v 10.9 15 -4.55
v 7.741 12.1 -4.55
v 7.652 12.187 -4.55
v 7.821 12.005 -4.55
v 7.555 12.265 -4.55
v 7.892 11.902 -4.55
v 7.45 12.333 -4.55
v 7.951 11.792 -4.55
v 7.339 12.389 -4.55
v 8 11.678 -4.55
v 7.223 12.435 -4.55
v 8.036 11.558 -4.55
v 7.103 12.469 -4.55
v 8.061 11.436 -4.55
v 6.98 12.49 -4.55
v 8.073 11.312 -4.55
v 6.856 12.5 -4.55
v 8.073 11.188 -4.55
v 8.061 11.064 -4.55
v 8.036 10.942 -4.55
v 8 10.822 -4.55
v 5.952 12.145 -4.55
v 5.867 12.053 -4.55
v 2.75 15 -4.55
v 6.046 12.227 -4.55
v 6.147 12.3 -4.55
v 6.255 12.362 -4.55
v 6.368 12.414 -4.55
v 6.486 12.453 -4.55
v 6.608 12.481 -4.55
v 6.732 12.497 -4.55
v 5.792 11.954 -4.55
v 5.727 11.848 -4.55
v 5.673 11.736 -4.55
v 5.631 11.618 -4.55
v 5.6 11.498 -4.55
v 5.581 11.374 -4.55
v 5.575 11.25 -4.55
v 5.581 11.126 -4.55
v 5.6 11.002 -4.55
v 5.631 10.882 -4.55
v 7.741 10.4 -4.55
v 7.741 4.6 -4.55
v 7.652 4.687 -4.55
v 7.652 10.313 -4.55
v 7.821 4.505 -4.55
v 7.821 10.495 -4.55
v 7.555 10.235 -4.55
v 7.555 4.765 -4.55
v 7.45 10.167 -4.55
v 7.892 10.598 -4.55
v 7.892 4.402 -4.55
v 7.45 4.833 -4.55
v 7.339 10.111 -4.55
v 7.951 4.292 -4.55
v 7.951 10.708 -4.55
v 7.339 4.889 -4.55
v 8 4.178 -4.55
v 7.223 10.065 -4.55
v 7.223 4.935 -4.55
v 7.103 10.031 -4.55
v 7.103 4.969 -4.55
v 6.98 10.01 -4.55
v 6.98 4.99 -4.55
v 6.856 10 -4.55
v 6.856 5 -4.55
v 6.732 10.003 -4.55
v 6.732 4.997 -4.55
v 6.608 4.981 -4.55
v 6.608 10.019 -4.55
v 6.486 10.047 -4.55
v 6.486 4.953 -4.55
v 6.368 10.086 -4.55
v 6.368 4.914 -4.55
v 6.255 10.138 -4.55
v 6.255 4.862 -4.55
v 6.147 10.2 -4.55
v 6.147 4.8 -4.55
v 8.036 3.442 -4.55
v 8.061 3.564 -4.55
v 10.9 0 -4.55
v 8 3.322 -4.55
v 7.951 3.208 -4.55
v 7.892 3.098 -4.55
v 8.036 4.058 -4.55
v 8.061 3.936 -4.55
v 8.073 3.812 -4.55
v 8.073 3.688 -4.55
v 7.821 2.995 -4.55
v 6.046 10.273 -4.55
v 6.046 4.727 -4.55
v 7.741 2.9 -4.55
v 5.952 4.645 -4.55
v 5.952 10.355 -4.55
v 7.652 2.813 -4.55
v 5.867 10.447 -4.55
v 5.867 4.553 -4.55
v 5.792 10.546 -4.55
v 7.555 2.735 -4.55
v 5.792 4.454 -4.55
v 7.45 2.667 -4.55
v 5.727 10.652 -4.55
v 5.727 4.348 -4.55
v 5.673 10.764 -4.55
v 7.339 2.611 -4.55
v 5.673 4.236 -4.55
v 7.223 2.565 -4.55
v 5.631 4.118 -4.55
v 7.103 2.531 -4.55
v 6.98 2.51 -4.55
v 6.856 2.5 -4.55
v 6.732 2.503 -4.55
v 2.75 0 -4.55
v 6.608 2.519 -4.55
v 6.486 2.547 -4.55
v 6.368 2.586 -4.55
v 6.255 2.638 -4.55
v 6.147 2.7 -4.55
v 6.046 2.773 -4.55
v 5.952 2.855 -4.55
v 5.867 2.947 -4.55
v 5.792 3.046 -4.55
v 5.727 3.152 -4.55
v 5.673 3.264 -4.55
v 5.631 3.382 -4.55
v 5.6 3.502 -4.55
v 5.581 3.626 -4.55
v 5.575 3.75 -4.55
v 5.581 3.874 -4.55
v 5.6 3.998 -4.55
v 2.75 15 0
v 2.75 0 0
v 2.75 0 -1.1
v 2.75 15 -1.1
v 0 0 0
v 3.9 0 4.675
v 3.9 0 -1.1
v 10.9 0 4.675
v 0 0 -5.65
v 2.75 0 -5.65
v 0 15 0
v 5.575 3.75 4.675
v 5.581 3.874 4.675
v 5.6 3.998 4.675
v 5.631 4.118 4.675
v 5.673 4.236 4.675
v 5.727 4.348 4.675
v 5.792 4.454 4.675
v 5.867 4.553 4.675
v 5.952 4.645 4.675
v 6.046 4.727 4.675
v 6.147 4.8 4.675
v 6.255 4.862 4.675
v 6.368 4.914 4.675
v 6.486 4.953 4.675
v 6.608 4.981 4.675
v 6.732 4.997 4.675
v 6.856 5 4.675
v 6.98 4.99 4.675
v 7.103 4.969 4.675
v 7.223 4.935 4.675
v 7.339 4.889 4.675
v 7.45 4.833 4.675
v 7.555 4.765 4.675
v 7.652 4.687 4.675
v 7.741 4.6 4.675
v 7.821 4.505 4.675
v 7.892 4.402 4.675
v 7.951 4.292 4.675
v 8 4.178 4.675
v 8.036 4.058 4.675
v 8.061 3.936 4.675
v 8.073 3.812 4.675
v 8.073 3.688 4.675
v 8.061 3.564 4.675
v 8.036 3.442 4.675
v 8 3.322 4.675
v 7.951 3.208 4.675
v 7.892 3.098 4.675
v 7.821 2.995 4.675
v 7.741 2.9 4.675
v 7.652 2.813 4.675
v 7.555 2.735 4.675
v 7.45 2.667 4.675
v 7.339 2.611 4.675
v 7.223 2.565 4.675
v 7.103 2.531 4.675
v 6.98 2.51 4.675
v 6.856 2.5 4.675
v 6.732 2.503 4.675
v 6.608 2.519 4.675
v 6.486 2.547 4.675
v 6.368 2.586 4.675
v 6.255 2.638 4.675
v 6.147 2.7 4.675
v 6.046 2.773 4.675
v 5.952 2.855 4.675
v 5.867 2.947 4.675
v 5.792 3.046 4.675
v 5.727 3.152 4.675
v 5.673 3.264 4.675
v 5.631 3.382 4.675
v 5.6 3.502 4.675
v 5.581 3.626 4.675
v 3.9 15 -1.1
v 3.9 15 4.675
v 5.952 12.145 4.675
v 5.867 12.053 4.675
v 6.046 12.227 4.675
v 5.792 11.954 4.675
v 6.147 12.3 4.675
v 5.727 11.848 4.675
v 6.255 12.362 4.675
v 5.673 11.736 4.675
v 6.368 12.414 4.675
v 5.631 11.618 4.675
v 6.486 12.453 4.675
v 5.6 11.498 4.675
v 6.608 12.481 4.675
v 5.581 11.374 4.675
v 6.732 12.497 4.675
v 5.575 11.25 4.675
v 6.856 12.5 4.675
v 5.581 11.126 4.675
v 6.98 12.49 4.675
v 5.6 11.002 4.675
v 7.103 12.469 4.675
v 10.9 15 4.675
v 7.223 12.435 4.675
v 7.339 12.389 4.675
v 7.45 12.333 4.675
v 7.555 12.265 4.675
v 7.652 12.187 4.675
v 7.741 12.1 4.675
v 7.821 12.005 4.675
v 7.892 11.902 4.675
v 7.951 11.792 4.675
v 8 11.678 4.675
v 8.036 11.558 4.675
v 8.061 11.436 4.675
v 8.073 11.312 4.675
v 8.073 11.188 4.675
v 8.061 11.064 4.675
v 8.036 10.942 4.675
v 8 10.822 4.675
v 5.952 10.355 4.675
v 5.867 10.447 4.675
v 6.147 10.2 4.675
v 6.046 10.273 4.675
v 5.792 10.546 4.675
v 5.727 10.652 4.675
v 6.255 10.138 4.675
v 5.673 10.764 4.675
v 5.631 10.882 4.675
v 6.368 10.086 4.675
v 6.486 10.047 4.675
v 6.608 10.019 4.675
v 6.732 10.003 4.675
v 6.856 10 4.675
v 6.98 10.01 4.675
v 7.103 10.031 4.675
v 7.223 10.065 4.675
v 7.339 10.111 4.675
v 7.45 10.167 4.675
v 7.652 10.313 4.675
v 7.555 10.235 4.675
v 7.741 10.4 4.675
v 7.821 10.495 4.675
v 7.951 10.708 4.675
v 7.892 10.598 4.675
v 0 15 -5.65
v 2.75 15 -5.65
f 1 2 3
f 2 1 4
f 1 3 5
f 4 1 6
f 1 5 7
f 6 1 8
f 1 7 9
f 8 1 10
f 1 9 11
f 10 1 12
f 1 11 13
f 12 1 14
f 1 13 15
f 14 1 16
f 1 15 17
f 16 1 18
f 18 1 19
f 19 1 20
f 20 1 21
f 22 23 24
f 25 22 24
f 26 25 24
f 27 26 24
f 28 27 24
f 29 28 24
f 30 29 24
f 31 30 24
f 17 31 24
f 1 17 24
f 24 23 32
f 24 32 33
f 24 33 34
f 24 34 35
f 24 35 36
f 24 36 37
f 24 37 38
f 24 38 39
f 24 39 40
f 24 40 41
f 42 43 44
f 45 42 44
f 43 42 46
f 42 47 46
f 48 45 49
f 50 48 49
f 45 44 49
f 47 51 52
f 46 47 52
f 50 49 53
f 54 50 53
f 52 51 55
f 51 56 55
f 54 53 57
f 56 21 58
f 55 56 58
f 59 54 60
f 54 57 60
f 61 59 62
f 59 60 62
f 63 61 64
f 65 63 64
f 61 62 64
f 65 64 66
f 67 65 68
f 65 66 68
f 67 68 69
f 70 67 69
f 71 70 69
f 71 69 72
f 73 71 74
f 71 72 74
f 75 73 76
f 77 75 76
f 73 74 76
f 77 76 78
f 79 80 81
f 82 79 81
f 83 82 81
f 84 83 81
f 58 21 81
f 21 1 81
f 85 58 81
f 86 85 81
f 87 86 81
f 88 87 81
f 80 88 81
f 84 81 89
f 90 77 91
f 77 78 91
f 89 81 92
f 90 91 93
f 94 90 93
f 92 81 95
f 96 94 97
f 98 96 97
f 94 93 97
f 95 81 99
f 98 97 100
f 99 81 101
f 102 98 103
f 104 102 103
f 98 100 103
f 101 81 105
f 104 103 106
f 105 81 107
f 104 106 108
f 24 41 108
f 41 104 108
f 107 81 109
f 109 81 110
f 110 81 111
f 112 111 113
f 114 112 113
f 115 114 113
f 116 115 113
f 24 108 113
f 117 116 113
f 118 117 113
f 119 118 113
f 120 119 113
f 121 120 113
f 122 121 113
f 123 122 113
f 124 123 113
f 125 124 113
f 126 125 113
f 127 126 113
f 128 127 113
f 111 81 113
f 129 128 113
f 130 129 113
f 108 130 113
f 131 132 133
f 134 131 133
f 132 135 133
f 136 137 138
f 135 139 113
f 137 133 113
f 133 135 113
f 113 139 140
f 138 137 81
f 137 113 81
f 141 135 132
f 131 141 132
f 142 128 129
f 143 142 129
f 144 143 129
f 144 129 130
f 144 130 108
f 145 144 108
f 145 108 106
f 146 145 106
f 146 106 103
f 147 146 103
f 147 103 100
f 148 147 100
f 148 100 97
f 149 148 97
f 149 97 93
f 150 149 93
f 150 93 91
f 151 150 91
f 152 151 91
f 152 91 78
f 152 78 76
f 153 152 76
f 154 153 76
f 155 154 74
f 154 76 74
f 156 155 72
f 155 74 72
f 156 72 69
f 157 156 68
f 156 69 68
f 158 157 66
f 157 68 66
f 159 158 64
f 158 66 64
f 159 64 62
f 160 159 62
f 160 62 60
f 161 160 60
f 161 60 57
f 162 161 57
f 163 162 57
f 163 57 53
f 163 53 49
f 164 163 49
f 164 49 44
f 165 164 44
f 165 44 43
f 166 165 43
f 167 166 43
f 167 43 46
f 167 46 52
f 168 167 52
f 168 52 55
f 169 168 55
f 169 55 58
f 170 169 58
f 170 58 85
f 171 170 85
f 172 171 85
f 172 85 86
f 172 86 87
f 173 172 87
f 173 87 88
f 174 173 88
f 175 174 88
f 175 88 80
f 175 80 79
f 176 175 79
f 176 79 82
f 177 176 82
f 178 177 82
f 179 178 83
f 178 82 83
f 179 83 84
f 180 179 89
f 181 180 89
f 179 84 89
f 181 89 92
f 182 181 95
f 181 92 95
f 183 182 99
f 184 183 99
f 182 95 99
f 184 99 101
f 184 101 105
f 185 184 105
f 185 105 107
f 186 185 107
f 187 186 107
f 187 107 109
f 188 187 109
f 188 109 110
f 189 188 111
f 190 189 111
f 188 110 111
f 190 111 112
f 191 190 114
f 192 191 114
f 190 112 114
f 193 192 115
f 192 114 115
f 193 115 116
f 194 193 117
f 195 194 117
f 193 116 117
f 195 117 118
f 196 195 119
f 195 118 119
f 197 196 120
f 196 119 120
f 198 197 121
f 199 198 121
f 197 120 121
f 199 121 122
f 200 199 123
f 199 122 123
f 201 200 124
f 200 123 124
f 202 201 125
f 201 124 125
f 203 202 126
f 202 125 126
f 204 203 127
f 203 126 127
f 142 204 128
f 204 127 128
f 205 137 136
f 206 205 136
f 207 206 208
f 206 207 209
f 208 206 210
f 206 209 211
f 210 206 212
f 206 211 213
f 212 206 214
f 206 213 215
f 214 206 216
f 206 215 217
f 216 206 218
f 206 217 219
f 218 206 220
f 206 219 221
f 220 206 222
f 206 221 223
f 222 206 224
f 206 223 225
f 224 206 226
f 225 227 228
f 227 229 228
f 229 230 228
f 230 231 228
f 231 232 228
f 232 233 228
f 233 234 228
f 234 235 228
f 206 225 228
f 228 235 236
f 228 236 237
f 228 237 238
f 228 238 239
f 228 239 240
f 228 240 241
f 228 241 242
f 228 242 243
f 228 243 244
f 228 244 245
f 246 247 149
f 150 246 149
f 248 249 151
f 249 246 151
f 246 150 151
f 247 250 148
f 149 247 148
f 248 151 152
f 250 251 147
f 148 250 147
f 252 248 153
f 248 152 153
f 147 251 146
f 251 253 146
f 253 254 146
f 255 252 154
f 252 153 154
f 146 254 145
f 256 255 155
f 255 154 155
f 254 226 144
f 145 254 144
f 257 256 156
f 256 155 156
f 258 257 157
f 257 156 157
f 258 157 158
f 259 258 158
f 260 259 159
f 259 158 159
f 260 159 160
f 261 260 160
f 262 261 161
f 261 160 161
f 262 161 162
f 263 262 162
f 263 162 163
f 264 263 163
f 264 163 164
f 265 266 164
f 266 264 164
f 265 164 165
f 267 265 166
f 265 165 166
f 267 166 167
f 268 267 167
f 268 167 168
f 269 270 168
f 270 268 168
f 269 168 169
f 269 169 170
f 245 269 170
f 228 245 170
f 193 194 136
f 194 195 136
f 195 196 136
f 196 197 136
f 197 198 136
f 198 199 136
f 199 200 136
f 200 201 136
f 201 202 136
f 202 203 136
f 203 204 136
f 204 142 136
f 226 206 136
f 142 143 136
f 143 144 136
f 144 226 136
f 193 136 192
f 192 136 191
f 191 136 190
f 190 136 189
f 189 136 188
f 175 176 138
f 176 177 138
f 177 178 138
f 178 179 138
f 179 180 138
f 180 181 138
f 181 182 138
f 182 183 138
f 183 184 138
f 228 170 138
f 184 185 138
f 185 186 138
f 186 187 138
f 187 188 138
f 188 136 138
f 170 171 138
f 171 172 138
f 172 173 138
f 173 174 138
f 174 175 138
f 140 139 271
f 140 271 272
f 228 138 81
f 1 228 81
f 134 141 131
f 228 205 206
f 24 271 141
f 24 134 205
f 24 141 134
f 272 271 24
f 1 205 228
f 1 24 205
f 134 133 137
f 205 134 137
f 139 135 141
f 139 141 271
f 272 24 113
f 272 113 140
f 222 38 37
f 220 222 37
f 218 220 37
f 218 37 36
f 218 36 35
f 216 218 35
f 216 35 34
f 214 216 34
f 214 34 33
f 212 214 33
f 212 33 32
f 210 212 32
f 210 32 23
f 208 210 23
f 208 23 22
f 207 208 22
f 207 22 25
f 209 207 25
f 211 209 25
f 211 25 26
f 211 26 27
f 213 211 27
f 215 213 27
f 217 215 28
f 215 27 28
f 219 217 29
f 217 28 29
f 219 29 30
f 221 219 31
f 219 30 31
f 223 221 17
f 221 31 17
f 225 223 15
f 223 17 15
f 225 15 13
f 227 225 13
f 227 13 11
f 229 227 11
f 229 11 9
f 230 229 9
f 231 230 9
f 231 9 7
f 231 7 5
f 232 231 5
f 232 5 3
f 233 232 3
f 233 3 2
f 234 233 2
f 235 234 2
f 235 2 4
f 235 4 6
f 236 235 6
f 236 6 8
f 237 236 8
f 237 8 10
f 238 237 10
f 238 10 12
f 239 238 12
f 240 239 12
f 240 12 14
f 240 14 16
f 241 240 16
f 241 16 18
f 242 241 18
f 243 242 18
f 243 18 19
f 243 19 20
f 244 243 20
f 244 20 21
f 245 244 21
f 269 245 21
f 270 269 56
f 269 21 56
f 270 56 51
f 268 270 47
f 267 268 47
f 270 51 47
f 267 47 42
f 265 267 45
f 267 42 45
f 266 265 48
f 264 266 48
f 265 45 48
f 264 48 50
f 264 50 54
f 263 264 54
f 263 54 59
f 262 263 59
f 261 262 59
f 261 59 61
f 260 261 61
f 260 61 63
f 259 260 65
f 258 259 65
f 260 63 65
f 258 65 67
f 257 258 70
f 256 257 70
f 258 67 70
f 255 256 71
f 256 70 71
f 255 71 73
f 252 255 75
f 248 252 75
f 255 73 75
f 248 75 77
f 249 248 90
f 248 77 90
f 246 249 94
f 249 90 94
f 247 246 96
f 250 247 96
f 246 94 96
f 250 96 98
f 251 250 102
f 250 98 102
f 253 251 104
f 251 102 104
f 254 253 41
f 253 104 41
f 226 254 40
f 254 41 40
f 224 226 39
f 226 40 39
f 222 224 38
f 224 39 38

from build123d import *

# Parameters (mm, degrees)
SKETCH1_W           = 2.75
SKETCH1_H           = 5.65
SKETCH1_W_2         = 1.15
SKETCH1_H_2         = 1.725
BOSS_EXTRUDE1_DEPTH = 15
SKETCH2_R           = 1.25
CUT_EXTRUDE1_DEPTH  = 21.710157532


with BuildPart() as part:
    # Sketch1 → Boss-Extrude1 (new body)
    with BuildSketch(Plane(origin=(0, 0, 0), x_dir=(1, 0, 0), z_dir=(0, 1, 0))):
        with Locations((1.375, 2.825)):
            Rectangle(SKETCH1_W, SKETCH1_H)
        with Locations((3.325, 3.6875)):
            Rectangle(SKETCH1_W_2, SKETCH1_H_2)
        with Locations((3.325, 1.9625)):
            Rectangle(SKETCH1_W_2, SKETCH1_H_2)
        Polygon((10.9, -4.675), (10.9, 4.55), (3.9, 4.55), (3.9, 2.825), (3.9, -4.675), align=None)
    extrude(amount=BOSS_EXTRUDE1_DEPTH)

    # Sketch2 → Cut-Extrude1 (cut, through all)
    with BuildSketch(Plane(origin=(0, 0, -4.55), x_dir=(-1, 0, 0), z_dir=(0, 0, -1))):
        with Locations((-6.825, 11.25)):
            Circle(SKETCH2_R)
        with Locations((-6.825, 3.75)):
            Circle(SKETCH2_R)
    extrude(amount=-CUT_EXTRUDE1_DEPTH, mode=Mode.SUBTRACT)


solid = part.part
